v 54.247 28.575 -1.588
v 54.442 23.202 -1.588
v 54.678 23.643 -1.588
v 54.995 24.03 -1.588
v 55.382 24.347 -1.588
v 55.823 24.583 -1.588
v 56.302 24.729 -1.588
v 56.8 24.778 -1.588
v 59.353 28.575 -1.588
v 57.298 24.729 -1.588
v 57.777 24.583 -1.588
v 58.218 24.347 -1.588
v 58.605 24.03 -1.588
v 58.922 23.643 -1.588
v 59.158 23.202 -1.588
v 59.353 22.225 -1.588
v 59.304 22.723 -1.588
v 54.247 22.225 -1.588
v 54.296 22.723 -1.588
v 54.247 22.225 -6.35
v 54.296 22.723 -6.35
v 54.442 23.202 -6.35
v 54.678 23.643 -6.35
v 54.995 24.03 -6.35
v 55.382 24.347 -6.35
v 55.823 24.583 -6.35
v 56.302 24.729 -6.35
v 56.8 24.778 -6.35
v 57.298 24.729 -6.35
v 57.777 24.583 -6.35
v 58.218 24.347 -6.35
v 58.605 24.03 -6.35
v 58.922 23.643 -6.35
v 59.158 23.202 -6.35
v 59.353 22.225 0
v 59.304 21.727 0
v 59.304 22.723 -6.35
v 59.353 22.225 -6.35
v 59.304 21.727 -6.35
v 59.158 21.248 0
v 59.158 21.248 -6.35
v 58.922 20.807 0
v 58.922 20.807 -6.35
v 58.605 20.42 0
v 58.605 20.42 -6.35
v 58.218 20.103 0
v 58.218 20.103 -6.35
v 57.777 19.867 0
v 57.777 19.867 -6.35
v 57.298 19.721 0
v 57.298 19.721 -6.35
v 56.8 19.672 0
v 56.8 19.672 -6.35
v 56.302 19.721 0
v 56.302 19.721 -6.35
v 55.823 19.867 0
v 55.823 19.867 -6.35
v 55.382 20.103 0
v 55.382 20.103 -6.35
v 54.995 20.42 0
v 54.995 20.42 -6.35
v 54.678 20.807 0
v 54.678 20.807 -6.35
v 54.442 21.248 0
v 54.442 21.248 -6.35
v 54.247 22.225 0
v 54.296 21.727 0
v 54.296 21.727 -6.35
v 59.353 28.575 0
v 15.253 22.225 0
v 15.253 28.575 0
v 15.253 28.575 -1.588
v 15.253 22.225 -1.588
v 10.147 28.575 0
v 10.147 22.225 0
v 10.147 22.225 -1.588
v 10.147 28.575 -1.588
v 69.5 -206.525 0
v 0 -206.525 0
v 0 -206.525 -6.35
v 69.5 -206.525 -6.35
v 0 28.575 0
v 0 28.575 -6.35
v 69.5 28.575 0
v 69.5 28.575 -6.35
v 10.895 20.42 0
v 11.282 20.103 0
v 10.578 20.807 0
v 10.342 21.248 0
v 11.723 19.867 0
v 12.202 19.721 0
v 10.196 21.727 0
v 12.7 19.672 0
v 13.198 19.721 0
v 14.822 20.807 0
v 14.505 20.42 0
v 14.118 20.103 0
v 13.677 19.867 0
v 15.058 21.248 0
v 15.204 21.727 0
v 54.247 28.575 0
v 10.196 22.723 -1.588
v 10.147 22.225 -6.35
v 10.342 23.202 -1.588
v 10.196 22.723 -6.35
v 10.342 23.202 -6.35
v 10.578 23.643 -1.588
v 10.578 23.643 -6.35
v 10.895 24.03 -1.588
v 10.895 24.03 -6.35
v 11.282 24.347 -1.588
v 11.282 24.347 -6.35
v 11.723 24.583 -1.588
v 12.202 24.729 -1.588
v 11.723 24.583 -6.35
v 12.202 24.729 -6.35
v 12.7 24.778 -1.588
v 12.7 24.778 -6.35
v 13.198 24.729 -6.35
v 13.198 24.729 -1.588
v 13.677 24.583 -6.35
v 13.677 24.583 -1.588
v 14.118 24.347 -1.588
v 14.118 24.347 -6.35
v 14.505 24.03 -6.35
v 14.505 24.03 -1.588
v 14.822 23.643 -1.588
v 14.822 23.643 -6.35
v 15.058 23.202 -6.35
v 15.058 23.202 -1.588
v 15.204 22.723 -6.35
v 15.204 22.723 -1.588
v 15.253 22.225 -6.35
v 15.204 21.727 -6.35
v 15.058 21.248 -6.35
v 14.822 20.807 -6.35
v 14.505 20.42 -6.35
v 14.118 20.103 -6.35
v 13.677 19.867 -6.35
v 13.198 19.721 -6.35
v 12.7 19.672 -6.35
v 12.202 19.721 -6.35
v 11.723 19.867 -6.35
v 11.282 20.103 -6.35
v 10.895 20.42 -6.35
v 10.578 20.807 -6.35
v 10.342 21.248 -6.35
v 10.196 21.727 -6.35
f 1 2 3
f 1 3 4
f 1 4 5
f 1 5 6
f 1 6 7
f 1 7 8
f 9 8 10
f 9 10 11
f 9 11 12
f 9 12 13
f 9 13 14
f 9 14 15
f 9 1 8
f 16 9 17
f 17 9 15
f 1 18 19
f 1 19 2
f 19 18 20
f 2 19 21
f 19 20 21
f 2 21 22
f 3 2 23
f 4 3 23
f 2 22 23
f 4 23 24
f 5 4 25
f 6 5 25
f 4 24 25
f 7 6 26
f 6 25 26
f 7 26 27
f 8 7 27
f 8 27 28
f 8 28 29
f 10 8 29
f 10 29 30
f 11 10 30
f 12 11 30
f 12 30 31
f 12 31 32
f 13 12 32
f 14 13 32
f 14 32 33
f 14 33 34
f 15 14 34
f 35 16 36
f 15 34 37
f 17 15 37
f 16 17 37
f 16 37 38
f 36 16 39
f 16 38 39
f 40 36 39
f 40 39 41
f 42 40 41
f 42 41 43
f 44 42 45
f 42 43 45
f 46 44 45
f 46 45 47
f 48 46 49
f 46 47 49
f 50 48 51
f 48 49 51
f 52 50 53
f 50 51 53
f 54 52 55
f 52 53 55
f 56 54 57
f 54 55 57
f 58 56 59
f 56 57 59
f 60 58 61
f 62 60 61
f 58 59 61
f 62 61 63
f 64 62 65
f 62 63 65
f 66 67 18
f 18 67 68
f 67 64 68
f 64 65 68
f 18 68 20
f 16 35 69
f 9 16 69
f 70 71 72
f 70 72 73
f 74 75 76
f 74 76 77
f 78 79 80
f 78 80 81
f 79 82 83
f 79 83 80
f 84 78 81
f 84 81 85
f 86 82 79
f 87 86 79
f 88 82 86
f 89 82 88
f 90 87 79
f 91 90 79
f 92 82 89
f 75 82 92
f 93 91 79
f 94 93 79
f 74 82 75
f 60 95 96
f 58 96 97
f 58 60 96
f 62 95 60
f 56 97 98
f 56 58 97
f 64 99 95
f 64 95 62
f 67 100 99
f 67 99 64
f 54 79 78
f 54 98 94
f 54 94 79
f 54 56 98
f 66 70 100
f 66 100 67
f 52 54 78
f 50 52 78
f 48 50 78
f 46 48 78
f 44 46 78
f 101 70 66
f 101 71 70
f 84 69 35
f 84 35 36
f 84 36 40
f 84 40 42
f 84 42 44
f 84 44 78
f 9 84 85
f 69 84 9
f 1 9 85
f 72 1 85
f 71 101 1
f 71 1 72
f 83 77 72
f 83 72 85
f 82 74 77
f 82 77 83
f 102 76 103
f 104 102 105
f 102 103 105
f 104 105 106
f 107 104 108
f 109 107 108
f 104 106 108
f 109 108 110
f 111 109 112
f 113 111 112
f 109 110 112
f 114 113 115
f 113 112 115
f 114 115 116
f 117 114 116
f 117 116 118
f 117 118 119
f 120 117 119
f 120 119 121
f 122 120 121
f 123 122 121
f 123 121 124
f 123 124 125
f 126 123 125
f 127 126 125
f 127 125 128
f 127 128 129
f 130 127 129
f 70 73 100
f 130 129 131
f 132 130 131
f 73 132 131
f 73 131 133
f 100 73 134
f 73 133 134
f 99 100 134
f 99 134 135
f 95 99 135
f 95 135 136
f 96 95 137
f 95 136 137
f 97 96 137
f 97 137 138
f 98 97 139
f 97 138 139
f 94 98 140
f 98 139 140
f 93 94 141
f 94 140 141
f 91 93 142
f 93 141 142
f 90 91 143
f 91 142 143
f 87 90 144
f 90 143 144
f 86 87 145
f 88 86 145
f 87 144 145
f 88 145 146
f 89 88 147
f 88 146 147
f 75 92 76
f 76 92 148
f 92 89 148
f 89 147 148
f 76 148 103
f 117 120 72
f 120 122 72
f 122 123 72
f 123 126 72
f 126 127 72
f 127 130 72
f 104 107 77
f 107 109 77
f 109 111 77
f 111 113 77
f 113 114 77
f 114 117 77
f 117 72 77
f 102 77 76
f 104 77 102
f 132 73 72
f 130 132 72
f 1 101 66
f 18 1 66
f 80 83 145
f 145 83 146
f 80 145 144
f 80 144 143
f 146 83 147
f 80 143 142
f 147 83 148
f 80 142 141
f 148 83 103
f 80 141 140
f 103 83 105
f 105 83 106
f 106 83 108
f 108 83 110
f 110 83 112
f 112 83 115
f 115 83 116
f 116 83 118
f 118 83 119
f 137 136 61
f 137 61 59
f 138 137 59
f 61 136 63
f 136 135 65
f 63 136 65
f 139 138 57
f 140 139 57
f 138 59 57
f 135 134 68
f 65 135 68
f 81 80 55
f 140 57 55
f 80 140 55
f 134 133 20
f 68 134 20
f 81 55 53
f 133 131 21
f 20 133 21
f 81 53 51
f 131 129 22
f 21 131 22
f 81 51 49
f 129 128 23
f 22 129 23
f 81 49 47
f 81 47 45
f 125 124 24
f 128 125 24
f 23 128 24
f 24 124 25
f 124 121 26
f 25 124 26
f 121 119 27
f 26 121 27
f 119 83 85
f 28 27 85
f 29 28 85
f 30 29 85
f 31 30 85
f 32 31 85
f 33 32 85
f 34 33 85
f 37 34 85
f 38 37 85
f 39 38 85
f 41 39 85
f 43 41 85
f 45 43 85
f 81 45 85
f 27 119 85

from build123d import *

# Parameters (mm, degrees)
BOSS_EXTRUDE1_DEPTH    = 6.35
F_10_CLEARANCE_HOLE1_D = 5.1054
CUT_EXTRUDE1_DEPTH     = 1.5875


with BuildPart() as part:
    # Sketch1 → Boss-Extrude1 (new body)
    with BuildSketch(Plane.XY):
        Polygon((0, 15.875), (0, -206.525), (69.5, -206.525), (69.5, 15.875), (69.5, 28.575), (0, 28.575), align=None)
    extrude(amount=-BOSS_EXTRUDE1_DEPTH)

    # #10 Clearance Hole1 (through all)
    with Locations(Plane.XY):
        with Locations((12.7, 22.225), (56.8, 22.225)):
            Hole(F_10_CLEARANCE_HOLE1_D / 2)

    # Sketch6 → Cut-Extrude1 (cut)
    with BuildSketch(Plane(origin=(0, 0, 0), x_dir=(-1, 0, 0), z_dir=(0, 0, -1))):
        with BuildLine():
            Line((-59.3527, 22.225), (-59.3527, 28.575))
            Line((-59.3527, 28.575), (-54.2473, 28.575))
            Line((-54.2473, 28.575), (-54.2473, 22.225))
            ThreePointArc((-54.2473, 22.225), (-56.8, 19.6723), (-59.3527, 22.225))
        make_face()
        with BuildLine():
            Line((-10.1473, 22.225), (-10.1473, 28.575))
            Line((-10.1473, 28.575), (-15.2527, 28.575))
            Line((-15.2527, 28.575), (-15.2527, 22.225))
            ThreePointArc((-15.2527, 22.225), (-12.7, 19.6723), (-10.1473, 22.225))
        make_face()
    extrude(amount=CUT_EXTRUDE1_DEPTH, mode=Mode.SUBTRACT)


solid = part.part
